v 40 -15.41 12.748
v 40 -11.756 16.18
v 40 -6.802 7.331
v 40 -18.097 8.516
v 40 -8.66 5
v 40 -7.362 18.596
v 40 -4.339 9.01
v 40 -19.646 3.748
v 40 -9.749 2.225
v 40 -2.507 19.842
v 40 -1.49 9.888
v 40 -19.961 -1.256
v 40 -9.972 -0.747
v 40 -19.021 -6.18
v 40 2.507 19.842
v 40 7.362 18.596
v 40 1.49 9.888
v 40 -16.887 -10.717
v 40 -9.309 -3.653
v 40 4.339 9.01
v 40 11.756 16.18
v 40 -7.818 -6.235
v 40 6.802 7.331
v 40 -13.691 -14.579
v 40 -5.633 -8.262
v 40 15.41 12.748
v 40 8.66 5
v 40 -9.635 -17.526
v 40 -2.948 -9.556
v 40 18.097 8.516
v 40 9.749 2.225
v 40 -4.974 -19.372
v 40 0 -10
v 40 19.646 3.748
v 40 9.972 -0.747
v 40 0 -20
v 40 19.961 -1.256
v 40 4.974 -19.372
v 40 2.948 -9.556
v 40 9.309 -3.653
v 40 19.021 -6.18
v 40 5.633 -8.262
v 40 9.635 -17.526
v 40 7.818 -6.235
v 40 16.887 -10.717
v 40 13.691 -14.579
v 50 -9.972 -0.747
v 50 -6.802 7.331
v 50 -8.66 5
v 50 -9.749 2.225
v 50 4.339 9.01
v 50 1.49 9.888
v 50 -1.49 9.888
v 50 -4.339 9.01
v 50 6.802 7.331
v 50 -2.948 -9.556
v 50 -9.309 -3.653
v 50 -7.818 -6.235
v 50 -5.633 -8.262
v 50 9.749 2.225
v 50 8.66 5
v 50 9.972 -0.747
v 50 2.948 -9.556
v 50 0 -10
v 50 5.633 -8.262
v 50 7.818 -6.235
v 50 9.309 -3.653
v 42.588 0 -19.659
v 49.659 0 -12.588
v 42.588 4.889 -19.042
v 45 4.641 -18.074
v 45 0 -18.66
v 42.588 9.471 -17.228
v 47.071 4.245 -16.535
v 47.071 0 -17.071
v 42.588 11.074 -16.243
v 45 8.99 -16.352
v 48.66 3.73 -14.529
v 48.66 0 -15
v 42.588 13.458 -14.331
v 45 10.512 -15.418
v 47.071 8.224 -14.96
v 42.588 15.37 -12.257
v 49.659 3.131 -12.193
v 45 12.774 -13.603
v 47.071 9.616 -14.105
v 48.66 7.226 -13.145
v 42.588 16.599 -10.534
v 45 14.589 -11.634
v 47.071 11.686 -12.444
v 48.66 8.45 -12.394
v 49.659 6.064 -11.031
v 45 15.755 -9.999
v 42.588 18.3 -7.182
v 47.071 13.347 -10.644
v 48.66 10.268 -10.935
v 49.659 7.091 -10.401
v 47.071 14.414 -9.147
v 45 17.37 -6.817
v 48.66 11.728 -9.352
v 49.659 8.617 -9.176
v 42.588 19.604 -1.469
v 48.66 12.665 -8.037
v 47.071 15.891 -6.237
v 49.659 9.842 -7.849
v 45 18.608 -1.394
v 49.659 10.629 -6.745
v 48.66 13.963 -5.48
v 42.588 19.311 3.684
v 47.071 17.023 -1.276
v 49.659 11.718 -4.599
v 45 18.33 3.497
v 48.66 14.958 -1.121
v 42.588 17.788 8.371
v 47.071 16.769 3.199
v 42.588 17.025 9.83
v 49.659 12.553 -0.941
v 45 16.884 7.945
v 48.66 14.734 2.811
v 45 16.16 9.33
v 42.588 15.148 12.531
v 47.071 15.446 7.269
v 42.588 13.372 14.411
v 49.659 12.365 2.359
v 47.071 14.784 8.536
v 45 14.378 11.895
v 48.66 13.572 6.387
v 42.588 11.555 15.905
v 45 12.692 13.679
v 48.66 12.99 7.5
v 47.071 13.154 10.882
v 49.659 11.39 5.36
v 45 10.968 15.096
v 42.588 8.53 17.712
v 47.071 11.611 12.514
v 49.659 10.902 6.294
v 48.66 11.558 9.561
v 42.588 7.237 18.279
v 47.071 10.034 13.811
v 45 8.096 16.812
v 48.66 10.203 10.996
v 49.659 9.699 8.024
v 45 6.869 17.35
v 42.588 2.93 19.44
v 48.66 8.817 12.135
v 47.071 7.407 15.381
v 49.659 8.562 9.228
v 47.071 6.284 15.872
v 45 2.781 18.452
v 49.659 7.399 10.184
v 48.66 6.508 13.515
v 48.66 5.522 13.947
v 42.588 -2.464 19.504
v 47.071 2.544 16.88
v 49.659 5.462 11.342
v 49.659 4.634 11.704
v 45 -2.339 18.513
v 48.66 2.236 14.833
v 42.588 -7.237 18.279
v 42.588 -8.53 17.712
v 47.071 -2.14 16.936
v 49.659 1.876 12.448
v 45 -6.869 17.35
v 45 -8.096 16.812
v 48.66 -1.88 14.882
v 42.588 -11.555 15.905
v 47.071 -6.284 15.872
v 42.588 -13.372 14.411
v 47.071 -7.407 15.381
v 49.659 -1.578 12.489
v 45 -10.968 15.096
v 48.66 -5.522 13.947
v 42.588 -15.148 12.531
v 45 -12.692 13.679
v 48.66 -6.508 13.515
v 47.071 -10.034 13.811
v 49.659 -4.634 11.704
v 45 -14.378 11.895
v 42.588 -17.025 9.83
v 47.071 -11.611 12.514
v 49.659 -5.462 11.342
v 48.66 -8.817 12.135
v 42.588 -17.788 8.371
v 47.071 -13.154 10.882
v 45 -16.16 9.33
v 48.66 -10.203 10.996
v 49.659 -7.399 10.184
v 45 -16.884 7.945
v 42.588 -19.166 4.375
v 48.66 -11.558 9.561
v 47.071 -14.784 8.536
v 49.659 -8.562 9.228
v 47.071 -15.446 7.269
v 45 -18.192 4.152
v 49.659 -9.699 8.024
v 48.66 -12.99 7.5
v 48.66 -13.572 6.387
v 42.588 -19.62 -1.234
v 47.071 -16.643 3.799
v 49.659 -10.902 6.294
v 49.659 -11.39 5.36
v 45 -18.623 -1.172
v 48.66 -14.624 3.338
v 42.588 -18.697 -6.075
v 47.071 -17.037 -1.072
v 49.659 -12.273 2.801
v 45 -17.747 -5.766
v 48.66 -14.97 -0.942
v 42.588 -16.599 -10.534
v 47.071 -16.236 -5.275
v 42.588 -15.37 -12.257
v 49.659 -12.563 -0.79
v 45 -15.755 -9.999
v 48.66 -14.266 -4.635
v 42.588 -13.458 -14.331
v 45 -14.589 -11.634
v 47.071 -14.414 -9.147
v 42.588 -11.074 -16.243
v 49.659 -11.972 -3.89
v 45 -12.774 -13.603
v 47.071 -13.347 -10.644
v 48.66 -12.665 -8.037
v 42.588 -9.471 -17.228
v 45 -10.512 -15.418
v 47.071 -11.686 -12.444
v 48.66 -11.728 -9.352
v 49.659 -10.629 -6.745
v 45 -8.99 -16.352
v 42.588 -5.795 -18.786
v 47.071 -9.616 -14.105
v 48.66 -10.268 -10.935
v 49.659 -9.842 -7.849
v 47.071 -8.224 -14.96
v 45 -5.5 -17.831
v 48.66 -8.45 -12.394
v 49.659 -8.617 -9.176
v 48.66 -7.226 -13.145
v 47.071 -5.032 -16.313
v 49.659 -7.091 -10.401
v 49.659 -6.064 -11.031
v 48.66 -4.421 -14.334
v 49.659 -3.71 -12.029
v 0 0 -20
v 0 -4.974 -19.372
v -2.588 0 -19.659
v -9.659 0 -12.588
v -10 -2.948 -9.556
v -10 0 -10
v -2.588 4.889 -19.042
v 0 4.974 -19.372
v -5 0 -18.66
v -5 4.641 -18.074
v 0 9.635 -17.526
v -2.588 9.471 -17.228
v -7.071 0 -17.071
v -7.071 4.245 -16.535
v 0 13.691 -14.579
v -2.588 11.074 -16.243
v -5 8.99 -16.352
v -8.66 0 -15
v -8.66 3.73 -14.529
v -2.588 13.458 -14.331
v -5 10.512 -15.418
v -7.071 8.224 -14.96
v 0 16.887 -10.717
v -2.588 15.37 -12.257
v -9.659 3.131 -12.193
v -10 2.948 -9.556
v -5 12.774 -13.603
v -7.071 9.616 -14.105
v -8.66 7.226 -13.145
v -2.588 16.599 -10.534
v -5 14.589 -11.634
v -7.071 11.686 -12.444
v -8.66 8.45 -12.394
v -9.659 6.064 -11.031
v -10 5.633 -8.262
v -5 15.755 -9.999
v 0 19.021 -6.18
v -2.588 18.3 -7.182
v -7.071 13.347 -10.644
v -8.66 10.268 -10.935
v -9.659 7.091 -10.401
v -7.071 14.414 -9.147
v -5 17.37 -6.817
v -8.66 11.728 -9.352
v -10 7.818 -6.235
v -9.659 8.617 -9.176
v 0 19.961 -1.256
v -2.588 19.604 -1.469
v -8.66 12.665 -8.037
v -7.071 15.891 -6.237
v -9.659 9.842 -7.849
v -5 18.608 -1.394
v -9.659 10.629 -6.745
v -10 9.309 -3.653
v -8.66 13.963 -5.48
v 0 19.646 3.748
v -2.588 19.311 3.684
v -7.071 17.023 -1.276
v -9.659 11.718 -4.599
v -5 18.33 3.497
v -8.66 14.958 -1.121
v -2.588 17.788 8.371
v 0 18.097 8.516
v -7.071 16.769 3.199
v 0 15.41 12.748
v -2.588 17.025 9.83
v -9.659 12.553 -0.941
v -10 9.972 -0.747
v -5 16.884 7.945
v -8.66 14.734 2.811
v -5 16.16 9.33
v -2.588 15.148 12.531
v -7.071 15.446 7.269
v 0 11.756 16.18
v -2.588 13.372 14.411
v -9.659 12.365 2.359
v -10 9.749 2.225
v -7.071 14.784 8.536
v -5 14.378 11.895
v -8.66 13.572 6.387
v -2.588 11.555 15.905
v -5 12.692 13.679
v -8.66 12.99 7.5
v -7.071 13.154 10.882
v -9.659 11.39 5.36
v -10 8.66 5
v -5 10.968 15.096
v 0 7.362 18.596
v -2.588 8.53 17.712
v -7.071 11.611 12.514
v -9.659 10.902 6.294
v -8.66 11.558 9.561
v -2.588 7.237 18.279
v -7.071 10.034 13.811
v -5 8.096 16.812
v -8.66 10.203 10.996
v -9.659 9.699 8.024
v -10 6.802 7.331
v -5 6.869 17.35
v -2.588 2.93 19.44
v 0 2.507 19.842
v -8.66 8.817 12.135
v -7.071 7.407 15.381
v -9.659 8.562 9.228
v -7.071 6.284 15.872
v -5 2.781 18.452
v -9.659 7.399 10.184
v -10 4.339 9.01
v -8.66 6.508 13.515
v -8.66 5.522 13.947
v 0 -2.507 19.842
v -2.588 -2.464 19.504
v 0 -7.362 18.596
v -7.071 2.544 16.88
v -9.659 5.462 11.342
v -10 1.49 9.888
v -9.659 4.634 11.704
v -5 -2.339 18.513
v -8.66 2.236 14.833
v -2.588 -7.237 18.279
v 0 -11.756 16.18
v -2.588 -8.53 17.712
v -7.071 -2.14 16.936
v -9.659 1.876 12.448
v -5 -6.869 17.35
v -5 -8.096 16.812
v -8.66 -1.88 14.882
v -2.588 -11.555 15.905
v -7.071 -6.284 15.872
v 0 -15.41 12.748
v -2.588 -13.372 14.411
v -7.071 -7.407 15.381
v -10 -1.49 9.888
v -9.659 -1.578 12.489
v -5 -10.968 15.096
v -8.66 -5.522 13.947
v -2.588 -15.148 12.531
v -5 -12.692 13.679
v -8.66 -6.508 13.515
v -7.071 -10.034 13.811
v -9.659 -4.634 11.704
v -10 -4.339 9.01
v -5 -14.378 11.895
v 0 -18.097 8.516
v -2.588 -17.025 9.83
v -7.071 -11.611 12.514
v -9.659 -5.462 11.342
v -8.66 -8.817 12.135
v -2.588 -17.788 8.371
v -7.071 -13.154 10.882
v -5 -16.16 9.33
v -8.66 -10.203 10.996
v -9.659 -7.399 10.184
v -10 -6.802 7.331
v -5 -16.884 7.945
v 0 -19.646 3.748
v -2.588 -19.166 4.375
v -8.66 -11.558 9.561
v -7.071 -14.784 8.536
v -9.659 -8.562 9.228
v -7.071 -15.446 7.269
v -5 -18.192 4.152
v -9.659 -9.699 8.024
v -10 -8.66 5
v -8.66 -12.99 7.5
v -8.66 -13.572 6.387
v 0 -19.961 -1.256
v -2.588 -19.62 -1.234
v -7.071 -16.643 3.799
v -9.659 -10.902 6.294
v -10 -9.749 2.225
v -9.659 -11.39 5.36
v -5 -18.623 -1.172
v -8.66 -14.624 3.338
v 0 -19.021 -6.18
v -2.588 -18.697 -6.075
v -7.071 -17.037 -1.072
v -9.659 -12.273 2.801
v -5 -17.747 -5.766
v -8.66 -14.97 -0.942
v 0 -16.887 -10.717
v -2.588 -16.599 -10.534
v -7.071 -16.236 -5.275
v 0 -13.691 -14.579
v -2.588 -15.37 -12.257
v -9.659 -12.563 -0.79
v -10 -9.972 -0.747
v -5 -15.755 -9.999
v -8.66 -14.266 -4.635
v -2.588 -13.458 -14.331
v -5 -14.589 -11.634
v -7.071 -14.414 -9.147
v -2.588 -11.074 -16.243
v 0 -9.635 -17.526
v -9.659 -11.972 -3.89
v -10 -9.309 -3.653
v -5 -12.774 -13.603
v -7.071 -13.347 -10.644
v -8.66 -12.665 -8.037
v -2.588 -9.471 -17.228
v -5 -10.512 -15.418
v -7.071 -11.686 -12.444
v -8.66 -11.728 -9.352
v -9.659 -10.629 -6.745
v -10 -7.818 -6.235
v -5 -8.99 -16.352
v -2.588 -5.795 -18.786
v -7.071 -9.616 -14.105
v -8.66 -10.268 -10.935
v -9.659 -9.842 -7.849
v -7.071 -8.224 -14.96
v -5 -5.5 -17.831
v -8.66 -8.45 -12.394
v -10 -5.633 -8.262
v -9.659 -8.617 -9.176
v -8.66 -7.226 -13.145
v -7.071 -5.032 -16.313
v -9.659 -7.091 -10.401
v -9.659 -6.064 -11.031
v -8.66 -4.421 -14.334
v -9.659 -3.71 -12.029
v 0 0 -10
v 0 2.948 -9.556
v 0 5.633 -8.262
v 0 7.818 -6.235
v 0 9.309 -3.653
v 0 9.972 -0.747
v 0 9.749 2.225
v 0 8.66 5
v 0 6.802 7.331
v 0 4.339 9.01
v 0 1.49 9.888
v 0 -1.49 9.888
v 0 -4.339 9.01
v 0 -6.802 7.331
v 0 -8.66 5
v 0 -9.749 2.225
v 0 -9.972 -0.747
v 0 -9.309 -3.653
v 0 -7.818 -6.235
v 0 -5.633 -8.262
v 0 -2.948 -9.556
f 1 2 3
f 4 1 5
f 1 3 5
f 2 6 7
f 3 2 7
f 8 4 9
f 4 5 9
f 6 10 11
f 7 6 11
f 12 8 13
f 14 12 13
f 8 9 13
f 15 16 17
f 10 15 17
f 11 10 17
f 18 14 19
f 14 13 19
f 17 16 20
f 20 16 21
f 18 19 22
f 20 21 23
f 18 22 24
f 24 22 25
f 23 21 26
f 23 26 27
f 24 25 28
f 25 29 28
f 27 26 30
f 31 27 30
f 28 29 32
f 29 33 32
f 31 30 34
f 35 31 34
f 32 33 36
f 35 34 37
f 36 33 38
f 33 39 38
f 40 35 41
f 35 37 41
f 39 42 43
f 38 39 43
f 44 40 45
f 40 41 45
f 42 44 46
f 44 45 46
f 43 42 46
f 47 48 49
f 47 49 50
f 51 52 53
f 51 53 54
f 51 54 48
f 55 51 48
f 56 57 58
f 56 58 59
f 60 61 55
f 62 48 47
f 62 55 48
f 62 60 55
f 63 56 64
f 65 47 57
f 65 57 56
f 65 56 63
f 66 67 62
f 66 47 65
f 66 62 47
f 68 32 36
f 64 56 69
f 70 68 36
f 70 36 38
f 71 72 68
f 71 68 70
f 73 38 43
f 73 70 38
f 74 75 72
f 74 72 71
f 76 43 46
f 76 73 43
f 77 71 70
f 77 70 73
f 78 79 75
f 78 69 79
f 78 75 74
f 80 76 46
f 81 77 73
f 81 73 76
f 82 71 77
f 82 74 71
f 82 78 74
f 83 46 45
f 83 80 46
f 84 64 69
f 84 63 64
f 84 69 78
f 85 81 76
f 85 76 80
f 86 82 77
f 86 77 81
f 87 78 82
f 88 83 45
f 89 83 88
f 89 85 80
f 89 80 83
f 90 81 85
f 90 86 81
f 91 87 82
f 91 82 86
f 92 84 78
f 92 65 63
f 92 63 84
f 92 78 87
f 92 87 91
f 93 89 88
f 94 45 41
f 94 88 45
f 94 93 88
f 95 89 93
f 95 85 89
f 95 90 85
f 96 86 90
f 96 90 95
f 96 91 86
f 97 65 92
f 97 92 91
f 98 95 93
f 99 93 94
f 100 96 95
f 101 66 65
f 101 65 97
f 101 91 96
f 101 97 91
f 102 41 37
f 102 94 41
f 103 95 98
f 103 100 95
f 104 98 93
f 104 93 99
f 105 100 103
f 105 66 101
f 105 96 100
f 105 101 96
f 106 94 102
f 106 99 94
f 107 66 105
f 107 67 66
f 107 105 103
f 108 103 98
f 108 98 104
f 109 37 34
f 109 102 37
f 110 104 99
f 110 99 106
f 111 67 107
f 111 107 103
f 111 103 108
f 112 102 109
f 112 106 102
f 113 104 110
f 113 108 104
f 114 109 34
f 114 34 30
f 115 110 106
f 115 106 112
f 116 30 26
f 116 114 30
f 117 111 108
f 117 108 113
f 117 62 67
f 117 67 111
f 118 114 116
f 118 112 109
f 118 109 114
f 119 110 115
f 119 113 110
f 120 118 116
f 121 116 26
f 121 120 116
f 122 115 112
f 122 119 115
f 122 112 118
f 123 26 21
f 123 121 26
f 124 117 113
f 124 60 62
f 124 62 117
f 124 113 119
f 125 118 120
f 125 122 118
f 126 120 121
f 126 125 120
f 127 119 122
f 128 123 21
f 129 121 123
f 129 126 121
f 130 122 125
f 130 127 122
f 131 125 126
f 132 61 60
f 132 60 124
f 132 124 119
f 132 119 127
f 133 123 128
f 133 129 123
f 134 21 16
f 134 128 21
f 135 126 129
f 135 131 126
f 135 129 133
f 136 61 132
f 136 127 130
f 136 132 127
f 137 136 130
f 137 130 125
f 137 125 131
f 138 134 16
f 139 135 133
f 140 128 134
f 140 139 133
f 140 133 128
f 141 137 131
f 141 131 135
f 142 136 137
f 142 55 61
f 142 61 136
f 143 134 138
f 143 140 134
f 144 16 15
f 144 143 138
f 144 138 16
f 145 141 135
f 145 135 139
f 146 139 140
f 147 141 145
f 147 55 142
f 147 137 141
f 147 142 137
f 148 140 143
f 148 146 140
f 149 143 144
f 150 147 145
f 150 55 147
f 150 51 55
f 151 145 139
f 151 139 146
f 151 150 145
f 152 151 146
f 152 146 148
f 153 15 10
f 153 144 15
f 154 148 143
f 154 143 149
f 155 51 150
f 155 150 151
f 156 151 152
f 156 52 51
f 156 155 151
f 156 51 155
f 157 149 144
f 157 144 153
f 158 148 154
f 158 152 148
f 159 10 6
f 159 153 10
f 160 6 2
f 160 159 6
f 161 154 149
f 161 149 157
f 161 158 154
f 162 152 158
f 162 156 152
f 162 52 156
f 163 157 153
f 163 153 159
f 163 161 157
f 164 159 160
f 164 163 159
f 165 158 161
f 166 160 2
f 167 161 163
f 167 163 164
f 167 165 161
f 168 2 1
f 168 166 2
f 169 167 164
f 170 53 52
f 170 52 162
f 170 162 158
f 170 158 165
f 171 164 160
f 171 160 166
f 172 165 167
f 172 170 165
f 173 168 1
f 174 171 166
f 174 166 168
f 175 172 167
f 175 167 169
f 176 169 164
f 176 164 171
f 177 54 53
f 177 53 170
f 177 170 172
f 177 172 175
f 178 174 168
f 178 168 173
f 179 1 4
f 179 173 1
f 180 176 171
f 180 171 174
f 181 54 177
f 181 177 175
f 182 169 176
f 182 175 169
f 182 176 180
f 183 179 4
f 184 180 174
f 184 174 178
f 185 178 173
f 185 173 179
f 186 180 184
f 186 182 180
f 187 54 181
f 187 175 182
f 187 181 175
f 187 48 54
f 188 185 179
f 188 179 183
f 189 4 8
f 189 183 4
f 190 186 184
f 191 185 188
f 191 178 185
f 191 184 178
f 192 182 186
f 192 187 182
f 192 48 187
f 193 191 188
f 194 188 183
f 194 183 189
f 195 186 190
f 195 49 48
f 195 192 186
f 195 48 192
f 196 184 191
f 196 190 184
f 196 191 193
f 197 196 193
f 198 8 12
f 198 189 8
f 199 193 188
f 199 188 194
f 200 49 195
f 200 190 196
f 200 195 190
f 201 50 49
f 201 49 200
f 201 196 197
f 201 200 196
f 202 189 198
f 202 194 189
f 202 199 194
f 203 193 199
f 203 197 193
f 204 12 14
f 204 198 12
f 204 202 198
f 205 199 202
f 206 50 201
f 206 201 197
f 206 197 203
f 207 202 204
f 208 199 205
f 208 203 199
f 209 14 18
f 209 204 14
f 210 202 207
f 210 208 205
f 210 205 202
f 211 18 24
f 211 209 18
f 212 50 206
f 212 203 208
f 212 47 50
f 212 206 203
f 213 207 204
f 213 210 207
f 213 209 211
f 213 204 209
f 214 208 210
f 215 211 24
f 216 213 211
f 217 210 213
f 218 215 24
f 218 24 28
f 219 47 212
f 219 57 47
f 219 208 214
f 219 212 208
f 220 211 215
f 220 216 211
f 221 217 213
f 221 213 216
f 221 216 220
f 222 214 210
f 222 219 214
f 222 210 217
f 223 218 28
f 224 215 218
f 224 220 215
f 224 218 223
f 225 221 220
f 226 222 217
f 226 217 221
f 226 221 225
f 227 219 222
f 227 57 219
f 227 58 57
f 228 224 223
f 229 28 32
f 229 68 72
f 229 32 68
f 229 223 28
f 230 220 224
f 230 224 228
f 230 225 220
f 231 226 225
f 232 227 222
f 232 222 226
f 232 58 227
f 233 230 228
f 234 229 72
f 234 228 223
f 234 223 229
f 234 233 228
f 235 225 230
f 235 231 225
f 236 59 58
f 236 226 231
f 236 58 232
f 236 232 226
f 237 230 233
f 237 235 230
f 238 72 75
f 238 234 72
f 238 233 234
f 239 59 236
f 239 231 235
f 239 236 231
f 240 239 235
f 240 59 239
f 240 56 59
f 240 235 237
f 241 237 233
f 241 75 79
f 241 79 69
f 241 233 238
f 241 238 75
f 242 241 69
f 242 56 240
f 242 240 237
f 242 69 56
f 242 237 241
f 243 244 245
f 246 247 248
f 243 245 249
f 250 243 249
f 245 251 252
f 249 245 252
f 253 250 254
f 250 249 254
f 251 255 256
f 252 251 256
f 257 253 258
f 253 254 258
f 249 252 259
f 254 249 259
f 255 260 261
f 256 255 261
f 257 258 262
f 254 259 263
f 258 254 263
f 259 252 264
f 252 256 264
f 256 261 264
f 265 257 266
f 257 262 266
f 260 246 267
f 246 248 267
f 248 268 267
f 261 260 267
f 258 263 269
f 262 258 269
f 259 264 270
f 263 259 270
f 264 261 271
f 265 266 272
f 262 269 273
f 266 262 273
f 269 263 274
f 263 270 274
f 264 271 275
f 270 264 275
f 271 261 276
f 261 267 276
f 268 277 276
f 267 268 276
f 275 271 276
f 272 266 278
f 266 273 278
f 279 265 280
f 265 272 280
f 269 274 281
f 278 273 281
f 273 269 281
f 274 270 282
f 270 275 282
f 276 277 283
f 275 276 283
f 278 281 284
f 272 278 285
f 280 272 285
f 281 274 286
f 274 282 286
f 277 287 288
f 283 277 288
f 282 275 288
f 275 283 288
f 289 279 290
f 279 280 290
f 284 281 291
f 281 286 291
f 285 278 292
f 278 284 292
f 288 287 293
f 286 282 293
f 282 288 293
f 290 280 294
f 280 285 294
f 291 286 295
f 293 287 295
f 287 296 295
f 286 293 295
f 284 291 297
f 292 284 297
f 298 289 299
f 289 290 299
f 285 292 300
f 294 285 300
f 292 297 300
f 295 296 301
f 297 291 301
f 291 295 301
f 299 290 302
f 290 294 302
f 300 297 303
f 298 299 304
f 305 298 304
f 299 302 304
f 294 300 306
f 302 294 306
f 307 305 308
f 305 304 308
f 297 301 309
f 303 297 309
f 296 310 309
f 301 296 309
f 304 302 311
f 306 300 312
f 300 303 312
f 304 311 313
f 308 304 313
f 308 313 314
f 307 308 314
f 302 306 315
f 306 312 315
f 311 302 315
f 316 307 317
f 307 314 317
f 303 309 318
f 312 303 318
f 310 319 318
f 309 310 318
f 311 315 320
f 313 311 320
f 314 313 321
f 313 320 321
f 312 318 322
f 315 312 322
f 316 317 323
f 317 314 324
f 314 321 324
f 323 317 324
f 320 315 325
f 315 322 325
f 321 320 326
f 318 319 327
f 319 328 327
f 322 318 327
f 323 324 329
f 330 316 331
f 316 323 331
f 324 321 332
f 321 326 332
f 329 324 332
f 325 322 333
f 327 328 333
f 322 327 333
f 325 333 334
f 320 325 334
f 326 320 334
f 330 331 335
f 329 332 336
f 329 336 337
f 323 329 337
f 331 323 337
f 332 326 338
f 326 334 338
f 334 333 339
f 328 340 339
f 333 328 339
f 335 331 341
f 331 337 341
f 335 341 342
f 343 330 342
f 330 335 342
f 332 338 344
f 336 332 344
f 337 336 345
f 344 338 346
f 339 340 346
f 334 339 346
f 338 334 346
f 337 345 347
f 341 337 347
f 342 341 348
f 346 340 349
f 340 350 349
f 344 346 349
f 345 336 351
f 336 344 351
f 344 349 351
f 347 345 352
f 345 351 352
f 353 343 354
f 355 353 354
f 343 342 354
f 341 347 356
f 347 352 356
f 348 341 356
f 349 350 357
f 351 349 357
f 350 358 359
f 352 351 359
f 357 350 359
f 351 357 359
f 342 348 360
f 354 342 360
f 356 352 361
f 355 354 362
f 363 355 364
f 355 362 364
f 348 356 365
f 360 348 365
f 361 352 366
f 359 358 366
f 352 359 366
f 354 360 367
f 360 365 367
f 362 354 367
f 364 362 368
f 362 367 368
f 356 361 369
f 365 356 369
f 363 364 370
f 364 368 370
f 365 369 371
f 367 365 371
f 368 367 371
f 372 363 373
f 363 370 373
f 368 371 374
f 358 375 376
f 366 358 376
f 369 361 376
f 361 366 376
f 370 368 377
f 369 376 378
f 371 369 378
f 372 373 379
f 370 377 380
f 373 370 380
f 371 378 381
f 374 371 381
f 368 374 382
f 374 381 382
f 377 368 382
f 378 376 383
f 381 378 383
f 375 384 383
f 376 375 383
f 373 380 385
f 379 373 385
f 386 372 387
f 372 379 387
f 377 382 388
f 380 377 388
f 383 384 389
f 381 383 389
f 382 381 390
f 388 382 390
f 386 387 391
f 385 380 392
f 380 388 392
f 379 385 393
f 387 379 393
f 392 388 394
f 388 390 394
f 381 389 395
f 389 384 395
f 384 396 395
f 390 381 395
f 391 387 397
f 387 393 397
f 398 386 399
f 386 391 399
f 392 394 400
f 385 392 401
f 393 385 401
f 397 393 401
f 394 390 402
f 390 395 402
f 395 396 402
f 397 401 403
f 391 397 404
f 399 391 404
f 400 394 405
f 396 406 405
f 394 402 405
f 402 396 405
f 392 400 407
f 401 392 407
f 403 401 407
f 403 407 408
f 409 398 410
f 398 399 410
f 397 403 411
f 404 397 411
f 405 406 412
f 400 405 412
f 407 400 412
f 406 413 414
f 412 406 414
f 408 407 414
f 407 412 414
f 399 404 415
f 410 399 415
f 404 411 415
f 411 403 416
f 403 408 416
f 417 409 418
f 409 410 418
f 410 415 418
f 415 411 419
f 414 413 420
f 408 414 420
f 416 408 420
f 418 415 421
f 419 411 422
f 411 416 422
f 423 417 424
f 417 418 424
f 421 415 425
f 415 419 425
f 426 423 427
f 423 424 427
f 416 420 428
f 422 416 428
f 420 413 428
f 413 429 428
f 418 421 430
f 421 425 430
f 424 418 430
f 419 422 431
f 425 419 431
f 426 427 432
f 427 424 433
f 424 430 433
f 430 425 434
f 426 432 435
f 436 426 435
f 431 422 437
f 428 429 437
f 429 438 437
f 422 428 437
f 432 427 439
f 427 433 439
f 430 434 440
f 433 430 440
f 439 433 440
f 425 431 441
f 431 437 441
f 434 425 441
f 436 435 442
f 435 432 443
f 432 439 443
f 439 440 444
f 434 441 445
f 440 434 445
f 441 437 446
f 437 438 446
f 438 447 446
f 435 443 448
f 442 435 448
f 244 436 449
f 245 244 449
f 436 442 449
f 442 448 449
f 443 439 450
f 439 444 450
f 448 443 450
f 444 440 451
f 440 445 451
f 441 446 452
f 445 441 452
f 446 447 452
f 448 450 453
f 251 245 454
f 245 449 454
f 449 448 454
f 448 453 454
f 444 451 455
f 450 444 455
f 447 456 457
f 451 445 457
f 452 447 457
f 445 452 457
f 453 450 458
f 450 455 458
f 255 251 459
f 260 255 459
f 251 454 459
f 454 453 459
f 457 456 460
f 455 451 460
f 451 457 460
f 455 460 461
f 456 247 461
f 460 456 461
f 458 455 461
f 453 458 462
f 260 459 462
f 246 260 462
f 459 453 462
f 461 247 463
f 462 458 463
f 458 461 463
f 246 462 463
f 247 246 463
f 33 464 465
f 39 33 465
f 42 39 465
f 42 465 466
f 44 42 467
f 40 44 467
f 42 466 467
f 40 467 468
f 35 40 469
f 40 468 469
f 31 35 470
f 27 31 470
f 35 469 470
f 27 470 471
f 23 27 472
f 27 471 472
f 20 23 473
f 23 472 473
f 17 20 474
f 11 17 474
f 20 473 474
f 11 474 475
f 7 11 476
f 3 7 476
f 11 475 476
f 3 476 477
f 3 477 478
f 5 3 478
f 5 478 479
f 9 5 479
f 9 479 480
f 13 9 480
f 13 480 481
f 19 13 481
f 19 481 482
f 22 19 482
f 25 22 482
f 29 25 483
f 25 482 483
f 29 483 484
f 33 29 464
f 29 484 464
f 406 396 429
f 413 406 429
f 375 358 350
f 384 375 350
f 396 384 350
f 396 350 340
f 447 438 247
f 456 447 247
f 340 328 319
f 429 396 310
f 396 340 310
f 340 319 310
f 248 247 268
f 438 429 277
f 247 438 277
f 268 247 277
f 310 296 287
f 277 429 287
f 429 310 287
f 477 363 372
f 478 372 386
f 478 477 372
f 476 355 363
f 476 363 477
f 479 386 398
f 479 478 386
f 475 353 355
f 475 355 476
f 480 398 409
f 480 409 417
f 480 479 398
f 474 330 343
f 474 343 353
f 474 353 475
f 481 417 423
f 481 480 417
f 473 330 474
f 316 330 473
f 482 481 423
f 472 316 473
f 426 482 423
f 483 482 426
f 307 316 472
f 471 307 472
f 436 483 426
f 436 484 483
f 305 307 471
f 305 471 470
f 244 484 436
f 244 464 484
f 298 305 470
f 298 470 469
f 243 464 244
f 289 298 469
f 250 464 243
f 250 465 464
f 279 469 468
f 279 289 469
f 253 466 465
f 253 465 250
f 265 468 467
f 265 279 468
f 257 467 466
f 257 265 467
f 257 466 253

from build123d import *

# Parameters (mm, degrees)
SKETCH1_R            = 10
BOSS_EXTRUDE1_DEPTH  = 40
SKETCH2_R            = 20
BOSS_EXTRUDE2_DEPTH  = 10
FILLET1_R            = 10
FILLET1_OF_MIRROR1_R = 10


with BuildPart() as part:
    # Sketch1 → Boss-Extrude1 (new body)
    with BuildSketch(Plane(origin=(0, 0, 0), x_dir=(0, 0, -1), z_dir=(1, 0, 0))):
        Circle(SKETCH1_R)
    extrude(amount=BOSS_EXTRUDE1_DEPTH)

    # Sketch2 → Boss-Extrude2 (add)
    with BuildSketch(Plane(origin=(40, 0, 0), x_dir=(0, 0, -1), z_dir=(1, 0, 0))):
        Circle(SKETCH2_R)
    boss_extrude2 = extrude(amount=BOSS_EXTRUDE2_DEPTH)

    # Fillet1
    fillet1_edges = [part.edges().sort_by_distance(p)[0] for p in [
        (50, 0, 20),
    ]]
    fillet(fillet1_edges, radius=FILLET1_R - 0.0001)  # a hair under: the kernel refuses the full size

    # Mirror1: Boss-Extrude2 across plane
    add(boss_extrude2.mirror(Plane.ZY.offset(-20)))

    # Fillet1 of Mirror1
    fillet1_of_mirror1_edges = [part.edges().sort_by_distance(p)[0] for p in [
        (-10, 0, 20),
    ]]
    fillet(fillet1_of_mirror1_edges, radius=FILLET1_OF_MIRROR1_R - 0.0001)  # a hair under: the kernel refuses the full size


solid = part.part
